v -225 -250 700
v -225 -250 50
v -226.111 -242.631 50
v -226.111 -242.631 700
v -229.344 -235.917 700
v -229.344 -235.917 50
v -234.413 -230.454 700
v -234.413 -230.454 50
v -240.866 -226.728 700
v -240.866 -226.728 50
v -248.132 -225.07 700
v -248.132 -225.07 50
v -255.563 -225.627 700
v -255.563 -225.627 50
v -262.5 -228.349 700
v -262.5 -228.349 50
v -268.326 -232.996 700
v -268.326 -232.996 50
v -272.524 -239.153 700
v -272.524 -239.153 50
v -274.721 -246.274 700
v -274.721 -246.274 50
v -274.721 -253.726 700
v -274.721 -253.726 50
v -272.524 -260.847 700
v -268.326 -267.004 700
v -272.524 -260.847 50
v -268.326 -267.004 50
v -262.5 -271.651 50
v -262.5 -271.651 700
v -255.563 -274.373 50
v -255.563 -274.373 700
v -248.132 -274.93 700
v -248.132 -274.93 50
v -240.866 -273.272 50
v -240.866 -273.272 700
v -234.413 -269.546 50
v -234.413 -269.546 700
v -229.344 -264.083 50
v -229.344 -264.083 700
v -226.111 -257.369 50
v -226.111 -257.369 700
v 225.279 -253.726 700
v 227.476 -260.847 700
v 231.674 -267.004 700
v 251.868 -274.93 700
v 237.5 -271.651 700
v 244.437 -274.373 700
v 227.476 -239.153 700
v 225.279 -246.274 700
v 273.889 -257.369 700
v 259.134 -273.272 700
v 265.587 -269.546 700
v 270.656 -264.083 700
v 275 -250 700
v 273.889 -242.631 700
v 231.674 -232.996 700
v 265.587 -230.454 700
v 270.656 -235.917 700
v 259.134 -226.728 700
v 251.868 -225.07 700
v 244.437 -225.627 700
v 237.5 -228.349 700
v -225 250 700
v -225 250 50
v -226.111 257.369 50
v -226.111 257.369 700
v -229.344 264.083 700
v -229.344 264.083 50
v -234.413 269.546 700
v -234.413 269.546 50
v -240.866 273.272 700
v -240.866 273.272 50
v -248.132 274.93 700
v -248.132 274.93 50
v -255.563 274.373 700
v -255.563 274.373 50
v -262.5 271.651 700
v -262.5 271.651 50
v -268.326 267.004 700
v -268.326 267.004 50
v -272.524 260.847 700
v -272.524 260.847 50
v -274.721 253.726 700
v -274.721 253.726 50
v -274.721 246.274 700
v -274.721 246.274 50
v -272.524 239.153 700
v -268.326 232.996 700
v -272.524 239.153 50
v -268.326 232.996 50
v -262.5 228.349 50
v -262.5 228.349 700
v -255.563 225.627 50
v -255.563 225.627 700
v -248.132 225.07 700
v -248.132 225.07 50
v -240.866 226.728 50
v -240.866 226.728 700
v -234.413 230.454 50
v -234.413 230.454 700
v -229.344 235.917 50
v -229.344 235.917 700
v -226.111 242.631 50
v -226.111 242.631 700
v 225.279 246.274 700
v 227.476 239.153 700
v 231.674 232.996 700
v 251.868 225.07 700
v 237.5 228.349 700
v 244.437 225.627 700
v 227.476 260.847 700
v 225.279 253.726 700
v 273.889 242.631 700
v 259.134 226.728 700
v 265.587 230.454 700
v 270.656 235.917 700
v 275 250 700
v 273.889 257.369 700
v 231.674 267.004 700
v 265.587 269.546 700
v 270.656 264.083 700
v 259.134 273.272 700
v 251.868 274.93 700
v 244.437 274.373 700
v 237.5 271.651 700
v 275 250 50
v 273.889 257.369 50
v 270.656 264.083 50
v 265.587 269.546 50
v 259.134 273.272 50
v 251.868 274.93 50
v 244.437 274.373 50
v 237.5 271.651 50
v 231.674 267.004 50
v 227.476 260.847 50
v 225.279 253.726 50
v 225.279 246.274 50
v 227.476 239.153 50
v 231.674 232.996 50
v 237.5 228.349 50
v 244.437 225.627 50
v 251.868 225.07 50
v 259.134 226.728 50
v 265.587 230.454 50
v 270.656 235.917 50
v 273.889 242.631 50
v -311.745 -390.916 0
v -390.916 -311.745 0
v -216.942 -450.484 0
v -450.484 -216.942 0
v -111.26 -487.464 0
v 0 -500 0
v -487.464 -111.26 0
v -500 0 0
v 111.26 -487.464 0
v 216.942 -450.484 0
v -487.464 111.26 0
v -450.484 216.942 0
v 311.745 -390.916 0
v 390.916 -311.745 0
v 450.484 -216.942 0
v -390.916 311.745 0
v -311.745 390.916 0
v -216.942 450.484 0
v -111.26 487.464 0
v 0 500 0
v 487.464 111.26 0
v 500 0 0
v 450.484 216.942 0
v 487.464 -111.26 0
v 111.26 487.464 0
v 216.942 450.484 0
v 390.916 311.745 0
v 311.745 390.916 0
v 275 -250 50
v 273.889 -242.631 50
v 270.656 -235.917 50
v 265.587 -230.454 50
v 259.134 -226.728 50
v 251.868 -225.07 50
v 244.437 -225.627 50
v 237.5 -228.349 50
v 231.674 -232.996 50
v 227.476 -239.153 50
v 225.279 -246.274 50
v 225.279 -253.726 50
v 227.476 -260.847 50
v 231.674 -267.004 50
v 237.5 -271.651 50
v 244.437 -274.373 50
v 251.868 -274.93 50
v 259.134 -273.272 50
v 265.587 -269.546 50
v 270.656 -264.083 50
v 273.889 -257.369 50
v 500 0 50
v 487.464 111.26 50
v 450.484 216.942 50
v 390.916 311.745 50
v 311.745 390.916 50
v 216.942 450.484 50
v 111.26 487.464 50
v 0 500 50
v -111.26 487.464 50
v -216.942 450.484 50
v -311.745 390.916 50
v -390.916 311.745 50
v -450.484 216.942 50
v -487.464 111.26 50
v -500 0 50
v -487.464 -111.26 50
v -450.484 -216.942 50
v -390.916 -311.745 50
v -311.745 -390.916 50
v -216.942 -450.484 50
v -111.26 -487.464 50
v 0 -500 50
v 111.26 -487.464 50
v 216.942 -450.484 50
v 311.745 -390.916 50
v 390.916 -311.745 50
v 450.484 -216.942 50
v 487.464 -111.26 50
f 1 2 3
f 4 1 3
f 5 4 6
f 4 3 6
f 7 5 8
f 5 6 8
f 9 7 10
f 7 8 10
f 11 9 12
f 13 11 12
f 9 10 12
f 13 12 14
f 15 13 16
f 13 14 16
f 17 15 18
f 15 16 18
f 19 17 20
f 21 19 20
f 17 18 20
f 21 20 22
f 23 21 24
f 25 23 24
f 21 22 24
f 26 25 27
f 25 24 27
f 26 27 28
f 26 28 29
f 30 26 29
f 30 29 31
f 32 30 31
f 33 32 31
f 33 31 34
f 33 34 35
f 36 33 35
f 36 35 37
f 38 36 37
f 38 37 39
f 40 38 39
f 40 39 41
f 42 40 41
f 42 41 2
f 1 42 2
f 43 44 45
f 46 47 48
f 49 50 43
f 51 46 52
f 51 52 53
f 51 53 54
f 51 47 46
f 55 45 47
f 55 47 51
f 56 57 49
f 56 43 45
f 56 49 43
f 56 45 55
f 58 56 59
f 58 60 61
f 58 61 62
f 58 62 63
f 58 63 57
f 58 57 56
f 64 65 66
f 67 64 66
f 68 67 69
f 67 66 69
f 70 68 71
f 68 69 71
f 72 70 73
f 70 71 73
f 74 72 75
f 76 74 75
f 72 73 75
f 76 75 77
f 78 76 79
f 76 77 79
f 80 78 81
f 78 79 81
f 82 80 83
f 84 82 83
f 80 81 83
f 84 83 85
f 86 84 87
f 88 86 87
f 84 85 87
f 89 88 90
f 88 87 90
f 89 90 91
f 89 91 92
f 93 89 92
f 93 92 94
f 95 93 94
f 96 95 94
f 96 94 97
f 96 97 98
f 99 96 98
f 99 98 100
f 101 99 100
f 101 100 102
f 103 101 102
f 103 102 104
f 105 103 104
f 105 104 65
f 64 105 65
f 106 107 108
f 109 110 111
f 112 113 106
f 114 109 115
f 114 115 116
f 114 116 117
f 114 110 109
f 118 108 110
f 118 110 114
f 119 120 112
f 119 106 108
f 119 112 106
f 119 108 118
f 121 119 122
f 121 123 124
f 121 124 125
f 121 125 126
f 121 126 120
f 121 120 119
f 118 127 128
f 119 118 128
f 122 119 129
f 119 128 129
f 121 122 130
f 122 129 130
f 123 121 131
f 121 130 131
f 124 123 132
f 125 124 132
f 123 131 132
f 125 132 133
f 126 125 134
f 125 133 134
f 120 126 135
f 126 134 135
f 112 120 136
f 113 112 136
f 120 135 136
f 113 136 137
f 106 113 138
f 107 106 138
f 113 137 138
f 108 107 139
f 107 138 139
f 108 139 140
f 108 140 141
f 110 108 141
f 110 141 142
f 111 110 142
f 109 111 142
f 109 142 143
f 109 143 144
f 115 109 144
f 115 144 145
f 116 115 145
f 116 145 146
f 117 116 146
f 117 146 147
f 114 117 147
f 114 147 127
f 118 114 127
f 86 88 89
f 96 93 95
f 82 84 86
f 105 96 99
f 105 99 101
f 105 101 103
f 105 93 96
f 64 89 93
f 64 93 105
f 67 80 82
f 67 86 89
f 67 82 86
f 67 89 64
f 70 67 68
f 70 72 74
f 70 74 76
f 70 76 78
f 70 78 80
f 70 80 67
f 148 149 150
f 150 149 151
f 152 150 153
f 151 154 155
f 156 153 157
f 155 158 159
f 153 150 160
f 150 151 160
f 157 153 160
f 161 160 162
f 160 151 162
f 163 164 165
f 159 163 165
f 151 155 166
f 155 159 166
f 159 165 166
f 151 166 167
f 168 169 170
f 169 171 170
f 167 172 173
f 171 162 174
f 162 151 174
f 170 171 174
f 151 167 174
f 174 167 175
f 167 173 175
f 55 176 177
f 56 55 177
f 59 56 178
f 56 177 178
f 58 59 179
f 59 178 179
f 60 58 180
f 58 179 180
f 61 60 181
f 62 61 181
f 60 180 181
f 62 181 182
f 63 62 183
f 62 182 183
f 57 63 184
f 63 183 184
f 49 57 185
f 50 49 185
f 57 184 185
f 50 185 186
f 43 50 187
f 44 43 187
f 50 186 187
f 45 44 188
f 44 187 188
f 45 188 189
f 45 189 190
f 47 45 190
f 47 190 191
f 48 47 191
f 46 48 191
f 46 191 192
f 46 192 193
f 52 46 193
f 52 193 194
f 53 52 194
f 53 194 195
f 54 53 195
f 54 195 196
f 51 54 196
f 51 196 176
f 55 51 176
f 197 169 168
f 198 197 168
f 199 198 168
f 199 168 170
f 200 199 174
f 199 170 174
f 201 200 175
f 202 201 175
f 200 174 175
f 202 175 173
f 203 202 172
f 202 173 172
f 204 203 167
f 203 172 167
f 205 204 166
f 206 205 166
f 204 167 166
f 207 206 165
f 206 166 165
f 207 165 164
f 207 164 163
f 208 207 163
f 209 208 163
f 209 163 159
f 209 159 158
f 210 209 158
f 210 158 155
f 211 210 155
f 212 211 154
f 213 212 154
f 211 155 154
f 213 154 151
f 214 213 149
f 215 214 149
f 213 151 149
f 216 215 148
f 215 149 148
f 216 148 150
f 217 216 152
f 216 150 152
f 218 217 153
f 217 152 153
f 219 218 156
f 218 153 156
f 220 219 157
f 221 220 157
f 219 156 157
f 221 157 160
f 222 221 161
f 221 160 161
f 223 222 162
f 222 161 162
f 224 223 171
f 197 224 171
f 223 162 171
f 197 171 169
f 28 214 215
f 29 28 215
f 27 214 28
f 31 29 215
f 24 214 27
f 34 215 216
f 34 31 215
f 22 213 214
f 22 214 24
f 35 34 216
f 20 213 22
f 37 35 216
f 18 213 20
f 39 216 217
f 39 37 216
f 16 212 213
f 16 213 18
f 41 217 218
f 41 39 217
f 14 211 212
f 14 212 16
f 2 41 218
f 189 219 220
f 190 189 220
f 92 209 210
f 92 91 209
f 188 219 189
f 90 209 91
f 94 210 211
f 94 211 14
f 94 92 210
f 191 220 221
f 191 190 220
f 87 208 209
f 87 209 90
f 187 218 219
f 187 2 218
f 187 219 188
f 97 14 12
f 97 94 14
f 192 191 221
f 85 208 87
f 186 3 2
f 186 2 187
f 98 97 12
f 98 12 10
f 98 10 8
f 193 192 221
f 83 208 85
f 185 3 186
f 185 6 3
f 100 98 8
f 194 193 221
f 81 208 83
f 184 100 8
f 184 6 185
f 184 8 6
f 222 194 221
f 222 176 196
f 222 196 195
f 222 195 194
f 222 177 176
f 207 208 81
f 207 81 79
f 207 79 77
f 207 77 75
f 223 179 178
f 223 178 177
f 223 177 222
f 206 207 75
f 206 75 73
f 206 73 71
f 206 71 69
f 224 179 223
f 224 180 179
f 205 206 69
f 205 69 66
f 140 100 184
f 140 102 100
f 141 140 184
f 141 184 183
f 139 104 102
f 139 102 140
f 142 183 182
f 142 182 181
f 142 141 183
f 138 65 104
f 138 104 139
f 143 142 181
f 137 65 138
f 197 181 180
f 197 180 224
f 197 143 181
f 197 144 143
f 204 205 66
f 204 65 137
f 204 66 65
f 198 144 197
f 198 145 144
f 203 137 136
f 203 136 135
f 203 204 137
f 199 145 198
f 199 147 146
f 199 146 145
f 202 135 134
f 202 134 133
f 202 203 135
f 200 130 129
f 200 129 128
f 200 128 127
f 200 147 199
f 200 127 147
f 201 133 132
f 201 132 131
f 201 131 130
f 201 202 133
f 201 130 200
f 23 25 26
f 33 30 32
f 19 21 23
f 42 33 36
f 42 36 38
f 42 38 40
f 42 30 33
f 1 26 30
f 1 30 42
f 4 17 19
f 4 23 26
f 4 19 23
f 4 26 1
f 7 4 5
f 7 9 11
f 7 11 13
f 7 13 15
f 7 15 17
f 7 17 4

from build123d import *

# Parameters (mm, degrees)
SKETCH_1_R      = 500
EXTRUDE_1_DEPTH = 50
SKETCH_2_R      = 25
EXTRUDE_2_DEPTH = 700
SKETCH_3_R      = 25
EXTRUDE_3_DEPTH = 700
SKETCH_4_R      = 25
EXTRUDE_4_DEPTH = 700
SKETCH_5_R      = 25
EXTRUDE_5_DEPTH = 700


with BuildPart() as part:
    # 草图1 → 凸台-拉伸1 (new body)
    with BuildSketch(Plane.XY):
        Circle(SKETCH_1_R)
    extrude(amount=EXTRUDE_1_DEPTH)

    # 草图2 → 凸台-拉伸2 (add)
    with BuildSketch(Plane.XY):
        with Locations((250, 250)):
            Circle(SKETCH_2_R)
    extrude(amount=EXTRUDE_2_DEPTH)

    # 草图3 → 凸台-拉伸3 (add)
    with BuildSketch(Plane.XY):
        with Locations((-250, 250)):
            Circle(SKETCH_3_R)
    extrude(amount=EXTRUDE_3_DEPTH)

    # 草图4 → 凸台-拉伸4 (add)
    with BuildSketch(Plane.XY):
        with Locations((250, -250)):
            Circle(SKETCH_4_R)
    extrude(amount=EXTRUDE_4_DEPTH)

    # 草图5 → 凸台-拉伸5 (add)
    with BuildSketch(Plane.XY):
        with Locations((-250, -250)):
            Circle(SKETCH_5_R)
    extrude(amount=EXTRUDE_5_DEPTH)


solid = part.part
